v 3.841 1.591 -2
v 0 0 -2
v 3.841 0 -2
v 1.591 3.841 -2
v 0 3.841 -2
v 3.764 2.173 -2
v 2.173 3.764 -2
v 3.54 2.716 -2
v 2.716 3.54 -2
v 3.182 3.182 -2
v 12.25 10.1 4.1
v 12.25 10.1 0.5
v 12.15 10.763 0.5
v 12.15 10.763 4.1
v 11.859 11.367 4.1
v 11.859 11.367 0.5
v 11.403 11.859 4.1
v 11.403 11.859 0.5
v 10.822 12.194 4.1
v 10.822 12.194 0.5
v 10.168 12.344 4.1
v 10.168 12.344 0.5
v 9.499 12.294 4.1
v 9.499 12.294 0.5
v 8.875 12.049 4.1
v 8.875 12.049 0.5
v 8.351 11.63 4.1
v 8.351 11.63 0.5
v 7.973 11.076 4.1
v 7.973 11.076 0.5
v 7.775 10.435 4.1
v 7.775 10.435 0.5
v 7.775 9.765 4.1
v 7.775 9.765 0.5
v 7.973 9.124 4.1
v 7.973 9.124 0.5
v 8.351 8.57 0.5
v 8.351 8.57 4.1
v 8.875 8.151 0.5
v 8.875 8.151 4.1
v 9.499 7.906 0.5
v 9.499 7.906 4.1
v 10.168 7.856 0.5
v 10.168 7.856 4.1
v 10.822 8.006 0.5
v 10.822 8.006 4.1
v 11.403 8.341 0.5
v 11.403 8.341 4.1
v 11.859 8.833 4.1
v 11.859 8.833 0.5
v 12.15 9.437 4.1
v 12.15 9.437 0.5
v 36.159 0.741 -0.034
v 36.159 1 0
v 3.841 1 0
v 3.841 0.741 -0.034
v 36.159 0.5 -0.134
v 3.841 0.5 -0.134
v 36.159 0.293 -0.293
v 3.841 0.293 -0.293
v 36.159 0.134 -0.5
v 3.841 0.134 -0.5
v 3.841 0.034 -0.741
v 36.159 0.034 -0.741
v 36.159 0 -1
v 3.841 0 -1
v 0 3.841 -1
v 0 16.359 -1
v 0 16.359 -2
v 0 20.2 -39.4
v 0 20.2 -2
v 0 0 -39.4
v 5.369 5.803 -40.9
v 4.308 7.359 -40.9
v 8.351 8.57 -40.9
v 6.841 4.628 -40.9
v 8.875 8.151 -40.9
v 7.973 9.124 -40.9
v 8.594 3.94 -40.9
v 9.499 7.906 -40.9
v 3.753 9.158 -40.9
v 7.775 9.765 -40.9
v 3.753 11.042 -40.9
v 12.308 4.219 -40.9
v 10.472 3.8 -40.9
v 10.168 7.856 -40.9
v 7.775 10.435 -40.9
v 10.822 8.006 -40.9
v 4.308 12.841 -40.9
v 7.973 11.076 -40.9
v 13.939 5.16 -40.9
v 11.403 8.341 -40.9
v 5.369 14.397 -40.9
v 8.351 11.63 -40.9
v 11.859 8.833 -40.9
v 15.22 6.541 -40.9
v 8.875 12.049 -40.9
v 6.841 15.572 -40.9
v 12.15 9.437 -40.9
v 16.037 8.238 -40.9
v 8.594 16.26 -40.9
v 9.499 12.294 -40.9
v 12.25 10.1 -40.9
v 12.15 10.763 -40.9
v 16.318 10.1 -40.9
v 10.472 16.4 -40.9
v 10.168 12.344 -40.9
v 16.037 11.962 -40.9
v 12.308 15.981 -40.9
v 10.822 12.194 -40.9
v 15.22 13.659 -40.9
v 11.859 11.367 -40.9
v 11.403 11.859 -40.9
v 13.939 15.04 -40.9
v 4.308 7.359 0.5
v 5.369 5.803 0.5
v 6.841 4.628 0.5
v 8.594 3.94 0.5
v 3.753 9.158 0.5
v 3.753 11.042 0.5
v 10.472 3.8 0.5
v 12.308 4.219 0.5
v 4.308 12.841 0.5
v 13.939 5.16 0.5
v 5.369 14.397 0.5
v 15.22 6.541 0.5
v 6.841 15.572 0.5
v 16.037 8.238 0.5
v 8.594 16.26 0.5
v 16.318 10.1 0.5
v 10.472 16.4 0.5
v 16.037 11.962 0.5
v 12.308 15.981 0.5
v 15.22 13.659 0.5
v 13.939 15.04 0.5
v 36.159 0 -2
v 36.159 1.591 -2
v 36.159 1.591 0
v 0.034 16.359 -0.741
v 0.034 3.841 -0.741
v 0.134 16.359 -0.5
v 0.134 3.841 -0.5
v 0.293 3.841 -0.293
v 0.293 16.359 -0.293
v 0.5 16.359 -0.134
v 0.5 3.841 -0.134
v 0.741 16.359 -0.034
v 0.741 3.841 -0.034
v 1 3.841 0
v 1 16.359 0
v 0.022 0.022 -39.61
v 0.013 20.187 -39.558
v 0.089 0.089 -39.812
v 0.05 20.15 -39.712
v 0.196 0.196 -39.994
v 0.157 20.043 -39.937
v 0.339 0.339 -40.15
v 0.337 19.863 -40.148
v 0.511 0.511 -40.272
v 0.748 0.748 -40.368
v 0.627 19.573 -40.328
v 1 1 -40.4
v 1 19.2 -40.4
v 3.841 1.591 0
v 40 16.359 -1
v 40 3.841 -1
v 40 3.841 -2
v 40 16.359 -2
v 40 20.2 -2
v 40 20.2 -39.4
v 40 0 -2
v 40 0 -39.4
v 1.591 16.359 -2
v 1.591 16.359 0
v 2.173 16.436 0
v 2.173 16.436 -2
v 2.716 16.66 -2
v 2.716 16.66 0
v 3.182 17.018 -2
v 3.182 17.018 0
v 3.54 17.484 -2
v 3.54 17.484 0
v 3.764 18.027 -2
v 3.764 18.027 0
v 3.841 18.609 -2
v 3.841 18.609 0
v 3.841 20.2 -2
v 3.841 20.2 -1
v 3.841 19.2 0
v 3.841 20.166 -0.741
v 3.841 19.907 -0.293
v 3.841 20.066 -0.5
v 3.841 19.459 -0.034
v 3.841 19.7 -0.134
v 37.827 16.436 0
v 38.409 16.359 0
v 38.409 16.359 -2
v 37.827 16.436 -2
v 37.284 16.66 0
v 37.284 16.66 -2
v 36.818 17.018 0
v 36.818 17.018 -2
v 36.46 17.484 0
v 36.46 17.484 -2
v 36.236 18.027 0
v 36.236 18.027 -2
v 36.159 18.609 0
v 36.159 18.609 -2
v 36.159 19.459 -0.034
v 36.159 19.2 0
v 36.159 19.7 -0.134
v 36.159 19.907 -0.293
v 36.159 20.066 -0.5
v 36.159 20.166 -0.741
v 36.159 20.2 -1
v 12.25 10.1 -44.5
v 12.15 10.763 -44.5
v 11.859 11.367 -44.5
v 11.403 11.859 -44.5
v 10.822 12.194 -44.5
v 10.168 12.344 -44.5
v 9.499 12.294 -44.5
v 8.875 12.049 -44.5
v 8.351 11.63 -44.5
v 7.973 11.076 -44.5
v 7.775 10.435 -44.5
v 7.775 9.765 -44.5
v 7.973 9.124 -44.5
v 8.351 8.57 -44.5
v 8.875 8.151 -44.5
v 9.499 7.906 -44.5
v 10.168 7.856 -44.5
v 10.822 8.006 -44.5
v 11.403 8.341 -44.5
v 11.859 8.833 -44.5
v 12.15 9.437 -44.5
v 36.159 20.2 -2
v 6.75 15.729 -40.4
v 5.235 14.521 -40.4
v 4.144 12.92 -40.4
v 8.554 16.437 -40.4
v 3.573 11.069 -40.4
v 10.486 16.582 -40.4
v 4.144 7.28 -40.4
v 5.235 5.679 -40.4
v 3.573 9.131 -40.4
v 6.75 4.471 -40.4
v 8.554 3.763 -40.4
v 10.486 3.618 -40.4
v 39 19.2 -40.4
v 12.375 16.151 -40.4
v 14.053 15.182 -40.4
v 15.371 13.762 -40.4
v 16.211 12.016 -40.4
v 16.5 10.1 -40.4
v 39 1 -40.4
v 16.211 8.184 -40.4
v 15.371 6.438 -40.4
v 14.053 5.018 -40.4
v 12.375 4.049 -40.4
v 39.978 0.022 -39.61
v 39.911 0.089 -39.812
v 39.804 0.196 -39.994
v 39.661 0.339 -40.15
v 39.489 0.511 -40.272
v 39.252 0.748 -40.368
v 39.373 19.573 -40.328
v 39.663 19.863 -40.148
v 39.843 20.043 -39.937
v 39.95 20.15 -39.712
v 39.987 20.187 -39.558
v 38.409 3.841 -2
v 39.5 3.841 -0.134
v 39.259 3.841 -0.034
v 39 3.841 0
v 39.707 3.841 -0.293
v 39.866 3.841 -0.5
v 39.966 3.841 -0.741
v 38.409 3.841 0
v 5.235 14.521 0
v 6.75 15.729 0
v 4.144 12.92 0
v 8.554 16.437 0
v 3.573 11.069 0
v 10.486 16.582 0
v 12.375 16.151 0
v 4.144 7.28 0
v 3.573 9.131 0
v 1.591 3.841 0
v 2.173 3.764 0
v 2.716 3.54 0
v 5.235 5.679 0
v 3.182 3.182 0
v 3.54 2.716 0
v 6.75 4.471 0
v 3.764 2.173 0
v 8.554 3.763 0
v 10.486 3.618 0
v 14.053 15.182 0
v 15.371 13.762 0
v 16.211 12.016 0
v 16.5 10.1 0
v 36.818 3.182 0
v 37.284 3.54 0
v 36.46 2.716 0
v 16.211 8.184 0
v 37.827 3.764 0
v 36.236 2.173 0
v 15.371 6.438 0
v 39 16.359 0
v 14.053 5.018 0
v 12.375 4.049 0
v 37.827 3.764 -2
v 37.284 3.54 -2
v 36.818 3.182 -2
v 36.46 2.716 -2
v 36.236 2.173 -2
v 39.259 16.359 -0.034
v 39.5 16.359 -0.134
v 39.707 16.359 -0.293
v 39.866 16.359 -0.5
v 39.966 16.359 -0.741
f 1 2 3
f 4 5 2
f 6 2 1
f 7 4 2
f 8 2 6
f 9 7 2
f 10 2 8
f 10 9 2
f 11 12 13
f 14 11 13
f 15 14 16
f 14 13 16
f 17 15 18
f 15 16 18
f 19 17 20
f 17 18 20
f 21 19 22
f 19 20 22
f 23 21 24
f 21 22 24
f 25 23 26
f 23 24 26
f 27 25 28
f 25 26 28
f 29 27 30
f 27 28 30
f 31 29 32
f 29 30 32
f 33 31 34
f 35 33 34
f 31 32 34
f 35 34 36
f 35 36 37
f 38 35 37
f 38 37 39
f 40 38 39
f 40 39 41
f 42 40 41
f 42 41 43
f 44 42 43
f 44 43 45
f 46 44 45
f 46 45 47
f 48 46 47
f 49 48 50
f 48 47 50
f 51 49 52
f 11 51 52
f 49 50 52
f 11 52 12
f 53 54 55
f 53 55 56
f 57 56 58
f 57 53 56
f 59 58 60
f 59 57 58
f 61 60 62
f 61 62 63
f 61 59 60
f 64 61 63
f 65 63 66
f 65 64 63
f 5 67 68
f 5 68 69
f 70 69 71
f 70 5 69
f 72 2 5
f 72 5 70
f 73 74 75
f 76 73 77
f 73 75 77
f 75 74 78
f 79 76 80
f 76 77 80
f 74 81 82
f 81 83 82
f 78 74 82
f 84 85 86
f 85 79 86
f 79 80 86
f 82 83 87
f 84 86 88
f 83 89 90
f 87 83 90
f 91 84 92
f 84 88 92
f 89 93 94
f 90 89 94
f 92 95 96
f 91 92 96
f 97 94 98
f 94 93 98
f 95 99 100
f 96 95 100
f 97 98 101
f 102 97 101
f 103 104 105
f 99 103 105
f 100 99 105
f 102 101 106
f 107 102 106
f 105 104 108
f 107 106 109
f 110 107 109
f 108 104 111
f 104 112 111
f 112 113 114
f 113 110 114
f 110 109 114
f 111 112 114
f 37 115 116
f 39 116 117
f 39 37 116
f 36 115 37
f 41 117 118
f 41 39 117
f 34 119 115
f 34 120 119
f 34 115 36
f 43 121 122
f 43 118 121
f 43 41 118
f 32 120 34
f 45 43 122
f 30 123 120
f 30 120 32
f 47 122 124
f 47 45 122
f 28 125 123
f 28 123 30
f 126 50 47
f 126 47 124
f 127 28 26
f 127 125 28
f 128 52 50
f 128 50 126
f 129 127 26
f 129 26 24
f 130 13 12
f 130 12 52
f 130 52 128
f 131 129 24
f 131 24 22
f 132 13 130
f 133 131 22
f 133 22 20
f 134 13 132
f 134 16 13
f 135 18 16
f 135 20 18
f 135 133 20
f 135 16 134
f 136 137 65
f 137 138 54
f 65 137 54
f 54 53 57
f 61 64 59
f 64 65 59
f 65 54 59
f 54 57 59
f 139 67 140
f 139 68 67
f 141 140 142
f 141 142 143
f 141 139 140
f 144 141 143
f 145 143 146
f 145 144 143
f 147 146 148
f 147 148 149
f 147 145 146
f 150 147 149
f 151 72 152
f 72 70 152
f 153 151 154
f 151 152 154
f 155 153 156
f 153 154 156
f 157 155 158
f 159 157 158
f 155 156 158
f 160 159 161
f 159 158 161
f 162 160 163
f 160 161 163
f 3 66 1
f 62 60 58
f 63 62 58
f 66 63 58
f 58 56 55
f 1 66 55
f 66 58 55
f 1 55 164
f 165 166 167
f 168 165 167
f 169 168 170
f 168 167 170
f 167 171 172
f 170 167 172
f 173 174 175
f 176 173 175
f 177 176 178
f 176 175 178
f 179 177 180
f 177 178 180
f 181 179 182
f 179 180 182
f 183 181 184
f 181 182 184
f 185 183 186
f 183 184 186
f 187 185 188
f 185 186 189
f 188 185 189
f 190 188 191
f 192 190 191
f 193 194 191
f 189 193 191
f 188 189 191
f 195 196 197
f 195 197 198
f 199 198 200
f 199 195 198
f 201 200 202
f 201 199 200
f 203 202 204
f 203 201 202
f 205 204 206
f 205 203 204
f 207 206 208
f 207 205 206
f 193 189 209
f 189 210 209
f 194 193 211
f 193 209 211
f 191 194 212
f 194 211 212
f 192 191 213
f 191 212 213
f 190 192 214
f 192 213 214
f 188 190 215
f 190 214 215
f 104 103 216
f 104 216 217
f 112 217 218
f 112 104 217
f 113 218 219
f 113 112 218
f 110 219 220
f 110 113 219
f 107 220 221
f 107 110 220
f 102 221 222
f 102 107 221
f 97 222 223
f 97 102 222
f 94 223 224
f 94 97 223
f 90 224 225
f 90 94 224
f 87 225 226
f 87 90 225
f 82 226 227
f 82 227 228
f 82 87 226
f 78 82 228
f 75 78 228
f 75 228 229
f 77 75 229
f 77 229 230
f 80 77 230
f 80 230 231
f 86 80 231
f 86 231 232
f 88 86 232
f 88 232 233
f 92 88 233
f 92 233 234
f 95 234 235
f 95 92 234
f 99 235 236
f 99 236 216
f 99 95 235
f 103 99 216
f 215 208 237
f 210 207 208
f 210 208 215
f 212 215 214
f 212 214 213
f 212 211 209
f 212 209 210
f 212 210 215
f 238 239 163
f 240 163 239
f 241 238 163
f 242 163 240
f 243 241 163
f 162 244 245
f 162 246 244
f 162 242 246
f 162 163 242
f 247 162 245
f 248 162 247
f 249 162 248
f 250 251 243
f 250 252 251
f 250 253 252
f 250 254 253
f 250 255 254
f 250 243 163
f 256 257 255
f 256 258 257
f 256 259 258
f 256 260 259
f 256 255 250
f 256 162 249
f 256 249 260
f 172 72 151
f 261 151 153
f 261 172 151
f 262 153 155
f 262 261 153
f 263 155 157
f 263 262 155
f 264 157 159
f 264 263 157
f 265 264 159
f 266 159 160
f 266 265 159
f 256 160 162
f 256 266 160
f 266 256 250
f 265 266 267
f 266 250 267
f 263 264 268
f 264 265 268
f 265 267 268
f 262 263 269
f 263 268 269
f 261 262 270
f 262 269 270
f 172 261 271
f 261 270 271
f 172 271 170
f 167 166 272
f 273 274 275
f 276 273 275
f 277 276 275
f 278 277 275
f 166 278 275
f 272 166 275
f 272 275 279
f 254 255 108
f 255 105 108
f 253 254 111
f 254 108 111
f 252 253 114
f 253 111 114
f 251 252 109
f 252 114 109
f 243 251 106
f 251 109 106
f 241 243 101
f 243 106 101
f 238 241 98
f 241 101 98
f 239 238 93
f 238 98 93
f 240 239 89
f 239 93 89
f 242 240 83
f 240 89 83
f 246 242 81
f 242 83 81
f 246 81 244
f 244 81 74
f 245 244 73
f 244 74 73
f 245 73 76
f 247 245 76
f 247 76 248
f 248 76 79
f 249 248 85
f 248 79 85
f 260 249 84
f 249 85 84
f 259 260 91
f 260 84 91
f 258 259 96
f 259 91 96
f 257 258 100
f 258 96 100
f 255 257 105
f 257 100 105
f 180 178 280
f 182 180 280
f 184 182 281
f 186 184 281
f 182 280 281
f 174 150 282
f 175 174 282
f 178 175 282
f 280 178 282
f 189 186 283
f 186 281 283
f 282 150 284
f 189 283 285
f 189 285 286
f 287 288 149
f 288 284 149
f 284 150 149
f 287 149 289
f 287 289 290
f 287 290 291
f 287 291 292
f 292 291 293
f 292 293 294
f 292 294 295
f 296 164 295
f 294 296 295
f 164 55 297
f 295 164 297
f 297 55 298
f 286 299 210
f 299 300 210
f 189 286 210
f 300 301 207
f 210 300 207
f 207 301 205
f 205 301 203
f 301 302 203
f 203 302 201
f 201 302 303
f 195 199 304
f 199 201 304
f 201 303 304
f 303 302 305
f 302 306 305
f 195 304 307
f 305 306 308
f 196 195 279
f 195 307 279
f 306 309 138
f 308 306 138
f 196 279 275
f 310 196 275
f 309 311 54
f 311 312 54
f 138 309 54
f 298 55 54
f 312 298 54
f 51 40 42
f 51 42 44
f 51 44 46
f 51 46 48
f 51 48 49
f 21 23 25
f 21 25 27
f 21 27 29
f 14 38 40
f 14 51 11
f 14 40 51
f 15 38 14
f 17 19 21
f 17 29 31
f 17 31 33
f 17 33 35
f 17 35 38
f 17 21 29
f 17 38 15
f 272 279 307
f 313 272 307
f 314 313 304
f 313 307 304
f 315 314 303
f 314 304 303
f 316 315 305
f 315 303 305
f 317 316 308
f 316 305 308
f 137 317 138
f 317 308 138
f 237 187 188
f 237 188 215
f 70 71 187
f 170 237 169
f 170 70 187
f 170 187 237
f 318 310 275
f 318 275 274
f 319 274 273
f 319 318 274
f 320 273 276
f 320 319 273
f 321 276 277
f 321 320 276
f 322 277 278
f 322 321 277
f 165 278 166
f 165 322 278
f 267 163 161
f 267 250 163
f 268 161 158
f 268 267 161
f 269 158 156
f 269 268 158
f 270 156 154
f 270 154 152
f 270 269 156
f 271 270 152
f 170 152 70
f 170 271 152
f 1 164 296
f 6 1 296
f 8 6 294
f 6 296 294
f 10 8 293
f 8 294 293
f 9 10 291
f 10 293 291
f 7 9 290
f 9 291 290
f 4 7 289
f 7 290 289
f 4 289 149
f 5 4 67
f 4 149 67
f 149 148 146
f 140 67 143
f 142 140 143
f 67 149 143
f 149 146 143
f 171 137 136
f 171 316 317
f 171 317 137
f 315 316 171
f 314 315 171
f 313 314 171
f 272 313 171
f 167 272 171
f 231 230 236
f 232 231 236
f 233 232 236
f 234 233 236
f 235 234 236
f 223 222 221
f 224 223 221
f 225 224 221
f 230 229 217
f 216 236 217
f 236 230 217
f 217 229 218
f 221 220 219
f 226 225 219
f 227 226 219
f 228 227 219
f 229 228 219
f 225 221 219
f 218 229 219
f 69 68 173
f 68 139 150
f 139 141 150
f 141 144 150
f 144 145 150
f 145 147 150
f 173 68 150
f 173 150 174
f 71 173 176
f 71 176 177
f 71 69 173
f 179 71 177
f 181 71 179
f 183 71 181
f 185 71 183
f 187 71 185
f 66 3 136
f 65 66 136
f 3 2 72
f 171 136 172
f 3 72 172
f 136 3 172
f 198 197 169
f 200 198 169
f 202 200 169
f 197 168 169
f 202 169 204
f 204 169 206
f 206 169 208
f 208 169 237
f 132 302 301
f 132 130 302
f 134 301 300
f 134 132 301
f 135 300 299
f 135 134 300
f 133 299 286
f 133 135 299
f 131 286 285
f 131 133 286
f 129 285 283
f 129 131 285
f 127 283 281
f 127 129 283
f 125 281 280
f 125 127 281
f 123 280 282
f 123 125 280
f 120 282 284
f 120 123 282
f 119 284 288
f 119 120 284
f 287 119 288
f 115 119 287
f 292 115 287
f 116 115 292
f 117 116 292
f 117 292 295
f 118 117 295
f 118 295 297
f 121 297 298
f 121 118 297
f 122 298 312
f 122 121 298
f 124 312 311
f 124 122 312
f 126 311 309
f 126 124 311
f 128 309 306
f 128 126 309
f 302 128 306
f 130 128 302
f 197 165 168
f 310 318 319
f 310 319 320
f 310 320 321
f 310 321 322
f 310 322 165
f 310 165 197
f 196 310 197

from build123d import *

# Parameters (mm, degrees)
SKETCH1_W           = 40
SKETCH1_H           = 40.4
BOSS_EXTRUDE1_DEPTH = 20.2
FILLET1_R           = 1
FILLET2_R           = 1
CUT_EXTRUDE1_DEPTH  = 2
SKETCH3_R           = 6.5
BOSS_EXTRUDE2_DEPTH = 0.5
BOSS_EXTRUDE2_TAPER = 20
SKETCH4_R           = 2.25
BOSS_EXTRUDE3_DEPTH = 3.6


with BuildPart() as part:
    # Sketch1 → Boss-Extrude1 (new body)
    with BuildSketch(Plane(origin=(0, 0, 0), x_dir=(1, 0, 0), z_dir=(0, 1, 0))):
        with Locations((20, 20.2)):
            Rectangle(SKETCH1_W, SKETCH1_H)
    extrude(amount=BOSS_EXTRUDE1_DEPTH)

    # Fillet1
    fillet1_edges = [part.edges().sort_by_distance(p)[0] for p in [
        (20, 0, 0),
        (40, 10.1, 0),
        (0, 10.1, 0),
        (20, 20.2, 0),
    ]]
    fillet(fillet1_edges, radius=FILLET1_R)

    # Fillet2
    fillet2_edges = [part.edges().sort_by_distance(p)[0] for p in [
        (20, 20.2, -40.4),
        (20, 0, -40.4),
        (0, 10.1, -40.4),
        (40, 10.1, -40.4),
    ]]
    fillet(fillet2_edges, radius=FILLET2_R)

    # Sketch2 → Cut-Extrude1 (cut)
    with BuildSketch(Plane.XY):
        with BuildLine():
            Line((1.590990258, 3.840990258), (-0.659009742, 3.840990258))
            Line((-0.659009742, 3.840990258), (-0.659009742, 1.590990258))
            ThreePointArc((-0.659009742, 1.590990258), (0, 0), (1.590990258, -0.659009742))
            Line((1.590990258, -0.659009742), (3.840990258, -0.557681221))
            Line((3.840990258, -0.557681221), (3.840990258, 1.590990258))
            ThreePointArc((3.840990258, 1.590990258), (3.181980515, 3.181980515), (1.590990258, 3.840990258))
        make_face()
        with BuildLine():
            Line((3.840990258, 18.609009742), (3.840990258, 20.859009742))
            Line((3.840990258, 20.859009742), (1.590990258, 20.859009742))
            ThreePointArc((1.590990258, 20.859009742), (0, 20.2), (-0.659009742, 18.609009742))
            Line((-0.659009742, 18.609009742), (-0.659009742, 16.359009742))
            Line((-0.659009742, 16.359009742), (1.590990258, 16.359009742))
            ThreePointArc((1.590990258, 16.359009742), (3.181980515, 17.018019485), (3.840990258, 18.609009742))
        make_face()
        with BuildLine():
            Line((36.159009742, -0.557681221), (38.409009742, -0.659009742))
            ThreePointArc((38.409009742, -0.659009742), (40, 0), (40.659009742, 1.590990258))
            Line((40.659009742, 1.590990258), (40.659009742, 3.840990258))
            Line((40.659009742, 3.840990258), (38.409009742, 3.840990258))
            ThreePointArc((38.409009742, 3.840990258), (36.818019485, 3.181980515), (36.159009742, 1.590990258))
            Line((36.159009742, 1.590990258), (36.159009742, -0.557681221))
        make_face()
        with BuildLine():
            Line((36.159009742, 18.609009742), (36.159009742, 20.859009742))
            Line((36.159009742, 20.859009742), (38.409009742, 20.859009742))
            ThreePointArc((38.409009742, 20.859009742), (40, 20.2), (40.659009742, 18.609009742))
            Line((40.659009742, 18.609009742), (40.659009742, 16.359009742))
            Line((40.659009742, 16.359009742), (38.409009742, 16.359009742))
            ThreePointArc((38.409009742, 16.359009742), (36.818019485, 17.018019485), (36.159009742, 18.609009742))
        make_face()
    extrude(amount=-CUT_EXTRUDE1_DEPTH, mode=Mode.SUBTRACT)

    # Sketch3 → Boss-Extrude2 (add)
    with BuildSketch(Plane.XY):
        with Locations((10, 10.1)):
            Circle(SKETCH3_R)
    boss_extrude2 = extrude(amount=BOSS_EXTRUDE2_DEPTH, taper=BOSS_EXTRUDE2_TAPER)

    # Sketch4 → Boss-Extrude3 (add)
    with BuildSketch(Plane.XY.offset(0.5)):
        with Locations((10, 10.1)):
            Circle(SKETCH4_R)
    boss_extrude3 = extrude(amount=BOSS_EXTRUDE3_DEPTH)

    # Mirror2: Boss-Extrude2, Boss-Extrude3 across plane
    add(boss_extrude2.mirror(Plane(origin=(0, 0, -20.2), x_dir=(1, 0, 0), z_dir=(0, 0, -1))))
    add(boss_extrude3.mirror(Plane(origin=(0, 0, -20.2), x_dir=(1, 0, 0), z_dir=(0, 0, -1))))


solid = part.part
